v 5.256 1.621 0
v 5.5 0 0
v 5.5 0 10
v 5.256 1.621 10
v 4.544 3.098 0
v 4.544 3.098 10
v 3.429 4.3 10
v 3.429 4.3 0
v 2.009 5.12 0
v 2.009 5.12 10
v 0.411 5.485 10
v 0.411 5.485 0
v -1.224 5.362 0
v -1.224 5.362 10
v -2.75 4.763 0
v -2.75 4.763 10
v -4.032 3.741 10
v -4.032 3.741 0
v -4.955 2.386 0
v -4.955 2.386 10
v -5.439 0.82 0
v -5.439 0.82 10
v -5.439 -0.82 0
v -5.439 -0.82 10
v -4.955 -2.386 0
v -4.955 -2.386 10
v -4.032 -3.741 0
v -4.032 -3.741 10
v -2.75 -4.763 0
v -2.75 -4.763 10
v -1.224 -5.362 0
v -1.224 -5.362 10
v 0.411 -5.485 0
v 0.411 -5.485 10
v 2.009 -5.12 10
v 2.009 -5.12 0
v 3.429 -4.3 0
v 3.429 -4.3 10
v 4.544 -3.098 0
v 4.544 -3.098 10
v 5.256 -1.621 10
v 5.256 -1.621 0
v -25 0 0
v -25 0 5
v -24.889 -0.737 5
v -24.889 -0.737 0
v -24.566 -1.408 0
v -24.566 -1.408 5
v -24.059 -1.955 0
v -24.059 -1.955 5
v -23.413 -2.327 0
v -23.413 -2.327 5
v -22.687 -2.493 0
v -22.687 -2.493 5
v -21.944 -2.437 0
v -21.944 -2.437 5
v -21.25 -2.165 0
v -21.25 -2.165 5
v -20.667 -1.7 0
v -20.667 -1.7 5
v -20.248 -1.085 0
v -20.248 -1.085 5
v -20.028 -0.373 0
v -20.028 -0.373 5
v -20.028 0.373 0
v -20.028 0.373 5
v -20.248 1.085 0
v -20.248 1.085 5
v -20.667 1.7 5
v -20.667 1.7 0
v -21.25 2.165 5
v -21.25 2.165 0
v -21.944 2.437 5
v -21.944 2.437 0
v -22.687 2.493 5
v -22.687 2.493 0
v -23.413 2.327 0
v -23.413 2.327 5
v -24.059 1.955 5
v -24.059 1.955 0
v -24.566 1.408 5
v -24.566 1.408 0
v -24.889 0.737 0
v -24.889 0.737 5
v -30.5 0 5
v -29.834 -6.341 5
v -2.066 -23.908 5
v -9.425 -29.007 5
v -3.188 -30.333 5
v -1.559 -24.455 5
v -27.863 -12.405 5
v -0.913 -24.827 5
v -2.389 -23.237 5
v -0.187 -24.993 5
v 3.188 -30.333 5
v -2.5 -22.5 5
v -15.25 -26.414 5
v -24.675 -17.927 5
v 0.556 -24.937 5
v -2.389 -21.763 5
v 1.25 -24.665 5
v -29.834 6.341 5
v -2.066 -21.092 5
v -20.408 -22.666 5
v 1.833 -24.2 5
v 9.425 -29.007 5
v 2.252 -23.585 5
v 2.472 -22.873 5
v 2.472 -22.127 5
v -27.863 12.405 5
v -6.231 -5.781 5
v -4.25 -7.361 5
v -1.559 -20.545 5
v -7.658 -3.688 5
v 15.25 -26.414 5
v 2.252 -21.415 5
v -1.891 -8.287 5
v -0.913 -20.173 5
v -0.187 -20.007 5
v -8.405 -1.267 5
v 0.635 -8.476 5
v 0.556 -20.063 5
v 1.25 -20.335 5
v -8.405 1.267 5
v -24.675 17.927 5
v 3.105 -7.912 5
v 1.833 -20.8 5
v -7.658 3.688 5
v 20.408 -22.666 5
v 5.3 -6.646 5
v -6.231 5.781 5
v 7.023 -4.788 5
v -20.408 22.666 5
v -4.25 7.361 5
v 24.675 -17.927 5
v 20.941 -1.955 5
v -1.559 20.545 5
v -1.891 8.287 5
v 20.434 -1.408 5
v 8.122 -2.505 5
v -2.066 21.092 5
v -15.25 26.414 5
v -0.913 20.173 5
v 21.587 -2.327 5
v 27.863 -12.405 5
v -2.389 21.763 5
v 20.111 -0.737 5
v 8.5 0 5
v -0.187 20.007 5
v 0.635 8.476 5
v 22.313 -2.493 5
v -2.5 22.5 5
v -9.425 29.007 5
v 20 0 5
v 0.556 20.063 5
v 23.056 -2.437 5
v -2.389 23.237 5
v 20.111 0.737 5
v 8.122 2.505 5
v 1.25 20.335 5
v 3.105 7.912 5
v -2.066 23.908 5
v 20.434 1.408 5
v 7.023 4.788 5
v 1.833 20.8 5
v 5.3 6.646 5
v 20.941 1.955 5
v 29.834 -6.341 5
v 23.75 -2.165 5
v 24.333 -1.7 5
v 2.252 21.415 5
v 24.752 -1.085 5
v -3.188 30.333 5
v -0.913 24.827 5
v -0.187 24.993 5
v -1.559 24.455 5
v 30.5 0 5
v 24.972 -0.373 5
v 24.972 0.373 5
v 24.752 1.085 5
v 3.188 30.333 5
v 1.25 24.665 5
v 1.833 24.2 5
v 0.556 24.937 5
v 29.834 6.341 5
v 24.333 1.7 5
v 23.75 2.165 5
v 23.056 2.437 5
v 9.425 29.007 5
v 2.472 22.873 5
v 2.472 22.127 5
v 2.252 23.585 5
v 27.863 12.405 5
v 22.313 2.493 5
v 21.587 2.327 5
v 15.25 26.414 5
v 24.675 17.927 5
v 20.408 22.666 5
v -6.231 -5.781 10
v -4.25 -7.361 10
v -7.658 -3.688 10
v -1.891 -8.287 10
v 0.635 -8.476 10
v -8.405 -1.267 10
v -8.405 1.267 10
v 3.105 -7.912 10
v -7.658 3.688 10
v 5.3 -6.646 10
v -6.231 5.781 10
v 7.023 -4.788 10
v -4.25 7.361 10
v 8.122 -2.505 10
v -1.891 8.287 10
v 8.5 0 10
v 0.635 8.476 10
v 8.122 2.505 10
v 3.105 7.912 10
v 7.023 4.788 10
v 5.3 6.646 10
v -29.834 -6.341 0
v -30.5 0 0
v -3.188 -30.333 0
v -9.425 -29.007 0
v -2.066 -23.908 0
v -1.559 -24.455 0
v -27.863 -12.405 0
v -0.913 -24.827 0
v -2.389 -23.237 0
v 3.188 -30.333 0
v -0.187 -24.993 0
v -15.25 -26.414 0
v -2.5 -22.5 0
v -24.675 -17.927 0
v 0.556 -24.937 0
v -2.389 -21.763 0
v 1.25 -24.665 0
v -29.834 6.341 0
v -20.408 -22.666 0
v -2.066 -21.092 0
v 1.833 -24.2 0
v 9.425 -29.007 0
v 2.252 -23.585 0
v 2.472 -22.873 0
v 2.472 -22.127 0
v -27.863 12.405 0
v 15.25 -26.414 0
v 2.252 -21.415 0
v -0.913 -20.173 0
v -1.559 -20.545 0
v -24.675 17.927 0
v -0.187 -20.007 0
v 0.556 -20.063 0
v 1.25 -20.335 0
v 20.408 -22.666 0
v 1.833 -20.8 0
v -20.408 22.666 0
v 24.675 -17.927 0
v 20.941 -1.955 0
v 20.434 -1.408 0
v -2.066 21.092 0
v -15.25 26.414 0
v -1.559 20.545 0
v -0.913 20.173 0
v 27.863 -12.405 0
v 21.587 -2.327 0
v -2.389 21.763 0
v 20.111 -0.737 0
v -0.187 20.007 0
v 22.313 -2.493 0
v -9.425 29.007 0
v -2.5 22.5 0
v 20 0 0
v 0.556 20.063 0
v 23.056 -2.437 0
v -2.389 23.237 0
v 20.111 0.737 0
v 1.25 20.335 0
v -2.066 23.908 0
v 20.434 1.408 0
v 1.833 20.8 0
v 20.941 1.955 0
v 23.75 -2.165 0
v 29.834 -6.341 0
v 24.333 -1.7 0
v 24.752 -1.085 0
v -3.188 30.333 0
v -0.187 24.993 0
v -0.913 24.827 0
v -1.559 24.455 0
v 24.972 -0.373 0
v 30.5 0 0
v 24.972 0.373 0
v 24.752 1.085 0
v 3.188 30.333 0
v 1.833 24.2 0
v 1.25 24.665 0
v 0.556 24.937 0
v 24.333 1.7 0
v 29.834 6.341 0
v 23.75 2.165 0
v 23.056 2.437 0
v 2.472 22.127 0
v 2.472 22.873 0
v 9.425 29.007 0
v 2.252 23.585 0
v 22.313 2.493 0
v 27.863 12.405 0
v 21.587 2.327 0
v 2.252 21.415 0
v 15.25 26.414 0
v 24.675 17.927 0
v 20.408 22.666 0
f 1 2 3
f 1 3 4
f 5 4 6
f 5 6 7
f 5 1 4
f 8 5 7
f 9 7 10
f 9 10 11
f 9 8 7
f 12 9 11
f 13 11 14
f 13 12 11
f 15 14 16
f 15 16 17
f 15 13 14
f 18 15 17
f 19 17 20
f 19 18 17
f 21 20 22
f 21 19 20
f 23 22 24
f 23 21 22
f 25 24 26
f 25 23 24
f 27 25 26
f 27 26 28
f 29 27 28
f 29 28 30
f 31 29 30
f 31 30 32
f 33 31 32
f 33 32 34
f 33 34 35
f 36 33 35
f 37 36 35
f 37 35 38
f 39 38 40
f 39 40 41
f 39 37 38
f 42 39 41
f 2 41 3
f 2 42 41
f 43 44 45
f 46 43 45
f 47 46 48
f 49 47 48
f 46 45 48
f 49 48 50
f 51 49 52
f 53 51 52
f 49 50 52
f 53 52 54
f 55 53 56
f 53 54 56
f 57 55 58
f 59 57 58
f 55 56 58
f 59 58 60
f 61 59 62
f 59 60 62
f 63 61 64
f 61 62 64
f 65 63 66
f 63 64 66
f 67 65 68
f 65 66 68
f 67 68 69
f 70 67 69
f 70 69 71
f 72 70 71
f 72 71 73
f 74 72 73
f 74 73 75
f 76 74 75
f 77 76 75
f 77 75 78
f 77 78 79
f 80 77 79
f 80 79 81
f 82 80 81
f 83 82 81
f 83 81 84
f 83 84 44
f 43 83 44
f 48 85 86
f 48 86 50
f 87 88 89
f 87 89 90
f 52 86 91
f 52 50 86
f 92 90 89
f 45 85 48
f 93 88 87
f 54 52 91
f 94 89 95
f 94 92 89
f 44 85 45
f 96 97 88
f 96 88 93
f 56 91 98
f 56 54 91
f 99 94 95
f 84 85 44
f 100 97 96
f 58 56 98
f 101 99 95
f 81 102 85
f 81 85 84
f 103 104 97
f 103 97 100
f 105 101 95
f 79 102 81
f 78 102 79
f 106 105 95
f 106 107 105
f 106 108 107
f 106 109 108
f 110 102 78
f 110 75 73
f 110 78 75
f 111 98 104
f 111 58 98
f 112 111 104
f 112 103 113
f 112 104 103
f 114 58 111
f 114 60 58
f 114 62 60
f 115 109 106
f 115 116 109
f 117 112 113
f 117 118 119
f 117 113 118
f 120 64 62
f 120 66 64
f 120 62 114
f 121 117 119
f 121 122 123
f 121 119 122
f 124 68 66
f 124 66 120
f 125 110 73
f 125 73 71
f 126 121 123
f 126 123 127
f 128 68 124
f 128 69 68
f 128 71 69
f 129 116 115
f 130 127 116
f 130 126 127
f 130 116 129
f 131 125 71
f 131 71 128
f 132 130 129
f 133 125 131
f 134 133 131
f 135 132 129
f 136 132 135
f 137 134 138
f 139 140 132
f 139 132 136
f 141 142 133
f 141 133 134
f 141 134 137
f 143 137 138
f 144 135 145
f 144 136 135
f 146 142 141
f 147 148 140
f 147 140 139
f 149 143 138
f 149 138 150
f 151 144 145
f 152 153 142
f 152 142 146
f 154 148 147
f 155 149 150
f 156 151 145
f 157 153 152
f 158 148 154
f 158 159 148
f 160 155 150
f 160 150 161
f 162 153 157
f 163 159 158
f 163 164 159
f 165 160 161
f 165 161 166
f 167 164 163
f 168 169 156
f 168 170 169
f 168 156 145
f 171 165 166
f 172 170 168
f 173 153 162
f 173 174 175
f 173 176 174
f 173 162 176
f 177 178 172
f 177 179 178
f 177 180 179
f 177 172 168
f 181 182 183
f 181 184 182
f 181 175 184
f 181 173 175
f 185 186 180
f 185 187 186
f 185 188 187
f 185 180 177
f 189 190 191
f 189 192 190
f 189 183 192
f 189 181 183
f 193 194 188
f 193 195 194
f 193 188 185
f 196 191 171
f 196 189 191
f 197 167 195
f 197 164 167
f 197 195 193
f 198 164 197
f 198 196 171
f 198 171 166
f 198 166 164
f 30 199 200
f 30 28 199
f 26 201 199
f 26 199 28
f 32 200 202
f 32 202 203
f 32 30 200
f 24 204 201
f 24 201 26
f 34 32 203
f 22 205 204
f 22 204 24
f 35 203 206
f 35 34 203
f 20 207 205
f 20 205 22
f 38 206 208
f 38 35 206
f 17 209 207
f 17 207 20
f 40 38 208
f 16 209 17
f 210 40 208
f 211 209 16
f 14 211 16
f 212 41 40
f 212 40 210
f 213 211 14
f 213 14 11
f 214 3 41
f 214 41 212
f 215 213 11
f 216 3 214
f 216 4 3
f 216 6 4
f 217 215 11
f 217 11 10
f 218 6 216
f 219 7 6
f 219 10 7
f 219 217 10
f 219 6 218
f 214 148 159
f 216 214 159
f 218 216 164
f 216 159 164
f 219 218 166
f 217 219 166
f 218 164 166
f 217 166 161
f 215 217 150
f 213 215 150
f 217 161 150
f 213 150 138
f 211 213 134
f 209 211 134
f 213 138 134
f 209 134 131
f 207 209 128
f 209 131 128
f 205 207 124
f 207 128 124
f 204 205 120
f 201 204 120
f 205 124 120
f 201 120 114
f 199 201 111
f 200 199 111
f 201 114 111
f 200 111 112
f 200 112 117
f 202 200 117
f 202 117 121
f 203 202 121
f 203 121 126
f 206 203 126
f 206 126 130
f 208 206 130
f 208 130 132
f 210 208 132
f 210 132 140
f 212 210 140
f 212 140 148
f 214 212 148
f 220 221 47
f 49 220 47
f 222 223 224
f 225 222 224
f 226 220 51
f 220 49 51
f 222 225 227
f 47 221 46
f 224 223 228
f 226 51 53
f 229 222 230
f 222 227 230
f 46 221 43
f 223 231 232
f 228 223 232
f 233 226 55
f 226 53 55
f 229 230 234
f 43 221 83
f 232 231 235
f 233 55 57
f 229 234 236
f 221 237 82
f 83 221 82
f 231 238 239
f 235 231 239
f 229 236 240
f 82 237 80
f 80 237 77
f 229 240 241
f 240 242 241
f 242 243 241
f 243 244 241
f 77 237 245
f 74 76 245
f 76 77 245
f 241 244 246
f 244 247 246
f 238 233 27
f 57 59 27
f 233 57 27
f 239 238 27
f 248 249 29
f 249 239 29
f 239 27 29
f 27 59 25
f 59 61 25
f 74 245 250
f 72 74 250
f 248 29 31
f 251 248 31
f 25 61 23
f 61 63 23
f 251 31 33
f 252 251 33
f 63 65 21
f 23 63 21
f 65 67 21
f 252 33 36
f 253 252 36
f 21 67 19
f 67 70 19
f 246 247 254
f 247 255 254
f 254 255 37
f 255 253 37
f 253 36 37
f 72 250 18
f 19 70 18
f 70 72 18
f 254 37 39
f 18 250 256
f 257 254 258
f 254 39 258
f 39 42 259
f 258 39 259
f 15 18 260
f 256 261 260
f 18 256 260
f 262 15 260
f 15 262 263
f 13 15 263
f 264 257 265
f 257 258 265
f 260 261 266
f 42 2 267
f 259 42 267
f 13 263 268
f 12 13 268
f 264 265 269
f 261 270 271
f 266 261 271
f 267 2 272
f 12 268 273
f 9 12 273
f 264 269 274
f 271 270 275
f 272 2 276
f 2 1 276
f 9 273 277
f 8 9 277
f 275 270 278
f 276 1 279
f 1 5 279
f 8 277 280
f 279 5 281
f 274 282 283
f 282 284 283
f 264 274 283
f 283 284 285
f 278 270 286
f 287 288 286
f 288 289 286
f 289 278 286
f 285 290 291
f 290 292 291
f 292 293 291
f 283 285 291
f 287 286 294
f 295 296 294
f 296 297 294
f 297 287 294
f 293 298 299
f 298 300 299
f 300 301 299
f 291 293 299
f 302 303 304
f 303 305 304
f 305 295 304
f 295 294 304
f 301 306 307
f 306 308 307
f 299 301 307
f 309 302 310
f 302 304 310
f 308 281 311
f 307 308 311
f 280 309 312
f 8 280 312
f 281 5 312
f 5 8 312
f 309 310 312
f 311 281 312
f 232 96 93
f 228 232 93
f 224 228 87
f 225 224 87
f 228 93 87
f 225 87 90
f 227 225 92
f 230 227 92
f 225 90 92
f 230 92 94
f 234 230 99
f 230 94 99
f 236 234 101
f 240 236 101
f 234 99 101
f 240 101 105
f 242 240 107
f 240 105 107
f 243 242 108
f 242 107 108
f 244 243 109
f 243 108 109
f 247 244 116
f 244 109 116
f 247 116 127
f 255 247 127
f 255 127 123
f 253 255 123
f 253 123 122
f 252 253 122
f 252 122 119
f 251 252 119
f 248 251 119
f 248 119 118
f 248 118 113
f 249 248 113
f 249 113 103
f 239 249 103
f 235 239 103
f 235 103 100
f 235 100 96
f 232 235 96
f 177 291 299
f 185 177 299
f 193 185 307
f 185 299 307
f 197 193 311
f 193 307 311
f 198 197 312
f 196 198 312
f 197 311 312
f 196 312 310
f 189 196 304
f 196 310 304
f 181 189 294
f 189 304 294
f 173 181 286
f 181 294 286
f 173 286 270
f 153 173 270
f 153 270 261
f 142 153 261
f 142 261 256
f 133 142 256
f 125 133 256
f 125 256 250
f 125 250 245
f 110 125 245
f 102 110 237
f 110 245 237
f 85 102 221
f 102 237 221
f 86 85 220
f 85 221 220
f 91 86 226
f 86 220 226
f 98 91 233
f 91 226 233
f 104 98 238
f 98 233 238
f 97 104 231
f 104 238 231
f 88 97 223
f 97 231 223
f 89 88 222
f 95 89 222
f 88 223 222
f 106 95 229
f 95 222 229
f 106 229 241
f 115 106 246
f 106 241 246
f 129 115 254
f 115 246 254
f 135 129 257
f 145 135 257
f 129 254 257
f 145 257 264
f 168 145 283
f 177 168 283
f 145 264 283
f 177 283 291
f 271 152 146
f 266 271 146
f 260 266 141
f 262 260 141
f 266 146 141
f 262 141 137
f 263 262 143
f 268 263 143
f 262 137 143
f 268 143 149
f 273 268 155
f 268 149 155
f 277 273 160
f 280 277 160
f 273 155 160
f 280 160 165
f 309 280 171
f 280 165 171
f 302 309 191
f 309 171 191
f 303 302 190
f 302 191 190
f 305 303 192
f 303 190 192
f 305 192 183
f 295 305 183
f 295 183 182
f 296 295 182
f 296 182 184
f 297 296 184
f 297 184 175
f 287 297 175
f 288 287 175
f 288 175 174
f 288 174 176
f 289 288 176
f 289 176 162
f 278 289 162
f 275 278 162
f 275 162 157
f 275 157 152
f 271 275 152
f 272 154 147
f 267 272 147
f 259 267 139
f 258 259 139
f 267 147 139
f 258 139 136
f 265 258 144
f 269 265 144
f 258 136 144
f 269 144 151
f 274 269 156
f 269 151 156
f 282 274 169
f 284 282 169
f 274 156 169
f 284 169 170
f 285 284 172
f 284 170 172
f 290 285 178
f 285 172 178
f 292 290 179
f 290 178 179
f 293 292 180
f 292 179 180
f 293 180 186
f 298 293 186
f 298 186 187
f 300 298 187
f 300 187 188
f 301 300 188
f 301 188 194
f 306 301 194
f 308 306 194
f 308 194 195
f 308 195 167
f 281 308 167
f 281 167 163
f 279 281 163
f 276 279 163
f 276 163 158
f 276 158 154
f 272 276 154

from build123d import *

# Parameters (mm, degrees)
F0_R     = 25.5
F0_R_2   = 8.5
F1_DEPTH = 5
F0_R_3   = 5.5
F2_DEPTH = 10
F3_D     = 5
F0_R_4   = 30.5
F4_DEPTH = 5


# Not quite as in the source:
# - a feature names something its author has since deleted; it is built from what else it names


with BuildPart() as f1:
    # F0 (on Top) → F1 (new body)
    with BuildSketch(Plane.XY):
        Circle(F0_R)
        Circle(F0_R_2, mode=Mode.SUBTRACT)
    extrude(amount=F1_DEPTH)

    # F0 (on Top) → F2 (join)
    with BuildSketch(Plane.XY):
        Circle(F0_R_2)
        Circle(F0_R_3, mode=Mode.SUBTRACT)
    extrude(amount=F2_DEPTH)

    # F3 (through all)
    with Locations(Plane(origin=(0, 0, 0), x_dir=(1, 0, 0), z_dir=(0, 0, -1))):
        with Locations((-22.5, 0), (0, -22.5), (22.5, 0), (0, 22.5)):
            Hole(F3_D / 2)

    # F0 (on Top) → F4 (join, through all)
    with BuildSketch(Plane.XY):
        Circle(F0_R_4)
        Circle(F0_R, mode=Mode.SUBTRACT)
    extrude(amount=F4_DEPTH)


solid = f1.part
